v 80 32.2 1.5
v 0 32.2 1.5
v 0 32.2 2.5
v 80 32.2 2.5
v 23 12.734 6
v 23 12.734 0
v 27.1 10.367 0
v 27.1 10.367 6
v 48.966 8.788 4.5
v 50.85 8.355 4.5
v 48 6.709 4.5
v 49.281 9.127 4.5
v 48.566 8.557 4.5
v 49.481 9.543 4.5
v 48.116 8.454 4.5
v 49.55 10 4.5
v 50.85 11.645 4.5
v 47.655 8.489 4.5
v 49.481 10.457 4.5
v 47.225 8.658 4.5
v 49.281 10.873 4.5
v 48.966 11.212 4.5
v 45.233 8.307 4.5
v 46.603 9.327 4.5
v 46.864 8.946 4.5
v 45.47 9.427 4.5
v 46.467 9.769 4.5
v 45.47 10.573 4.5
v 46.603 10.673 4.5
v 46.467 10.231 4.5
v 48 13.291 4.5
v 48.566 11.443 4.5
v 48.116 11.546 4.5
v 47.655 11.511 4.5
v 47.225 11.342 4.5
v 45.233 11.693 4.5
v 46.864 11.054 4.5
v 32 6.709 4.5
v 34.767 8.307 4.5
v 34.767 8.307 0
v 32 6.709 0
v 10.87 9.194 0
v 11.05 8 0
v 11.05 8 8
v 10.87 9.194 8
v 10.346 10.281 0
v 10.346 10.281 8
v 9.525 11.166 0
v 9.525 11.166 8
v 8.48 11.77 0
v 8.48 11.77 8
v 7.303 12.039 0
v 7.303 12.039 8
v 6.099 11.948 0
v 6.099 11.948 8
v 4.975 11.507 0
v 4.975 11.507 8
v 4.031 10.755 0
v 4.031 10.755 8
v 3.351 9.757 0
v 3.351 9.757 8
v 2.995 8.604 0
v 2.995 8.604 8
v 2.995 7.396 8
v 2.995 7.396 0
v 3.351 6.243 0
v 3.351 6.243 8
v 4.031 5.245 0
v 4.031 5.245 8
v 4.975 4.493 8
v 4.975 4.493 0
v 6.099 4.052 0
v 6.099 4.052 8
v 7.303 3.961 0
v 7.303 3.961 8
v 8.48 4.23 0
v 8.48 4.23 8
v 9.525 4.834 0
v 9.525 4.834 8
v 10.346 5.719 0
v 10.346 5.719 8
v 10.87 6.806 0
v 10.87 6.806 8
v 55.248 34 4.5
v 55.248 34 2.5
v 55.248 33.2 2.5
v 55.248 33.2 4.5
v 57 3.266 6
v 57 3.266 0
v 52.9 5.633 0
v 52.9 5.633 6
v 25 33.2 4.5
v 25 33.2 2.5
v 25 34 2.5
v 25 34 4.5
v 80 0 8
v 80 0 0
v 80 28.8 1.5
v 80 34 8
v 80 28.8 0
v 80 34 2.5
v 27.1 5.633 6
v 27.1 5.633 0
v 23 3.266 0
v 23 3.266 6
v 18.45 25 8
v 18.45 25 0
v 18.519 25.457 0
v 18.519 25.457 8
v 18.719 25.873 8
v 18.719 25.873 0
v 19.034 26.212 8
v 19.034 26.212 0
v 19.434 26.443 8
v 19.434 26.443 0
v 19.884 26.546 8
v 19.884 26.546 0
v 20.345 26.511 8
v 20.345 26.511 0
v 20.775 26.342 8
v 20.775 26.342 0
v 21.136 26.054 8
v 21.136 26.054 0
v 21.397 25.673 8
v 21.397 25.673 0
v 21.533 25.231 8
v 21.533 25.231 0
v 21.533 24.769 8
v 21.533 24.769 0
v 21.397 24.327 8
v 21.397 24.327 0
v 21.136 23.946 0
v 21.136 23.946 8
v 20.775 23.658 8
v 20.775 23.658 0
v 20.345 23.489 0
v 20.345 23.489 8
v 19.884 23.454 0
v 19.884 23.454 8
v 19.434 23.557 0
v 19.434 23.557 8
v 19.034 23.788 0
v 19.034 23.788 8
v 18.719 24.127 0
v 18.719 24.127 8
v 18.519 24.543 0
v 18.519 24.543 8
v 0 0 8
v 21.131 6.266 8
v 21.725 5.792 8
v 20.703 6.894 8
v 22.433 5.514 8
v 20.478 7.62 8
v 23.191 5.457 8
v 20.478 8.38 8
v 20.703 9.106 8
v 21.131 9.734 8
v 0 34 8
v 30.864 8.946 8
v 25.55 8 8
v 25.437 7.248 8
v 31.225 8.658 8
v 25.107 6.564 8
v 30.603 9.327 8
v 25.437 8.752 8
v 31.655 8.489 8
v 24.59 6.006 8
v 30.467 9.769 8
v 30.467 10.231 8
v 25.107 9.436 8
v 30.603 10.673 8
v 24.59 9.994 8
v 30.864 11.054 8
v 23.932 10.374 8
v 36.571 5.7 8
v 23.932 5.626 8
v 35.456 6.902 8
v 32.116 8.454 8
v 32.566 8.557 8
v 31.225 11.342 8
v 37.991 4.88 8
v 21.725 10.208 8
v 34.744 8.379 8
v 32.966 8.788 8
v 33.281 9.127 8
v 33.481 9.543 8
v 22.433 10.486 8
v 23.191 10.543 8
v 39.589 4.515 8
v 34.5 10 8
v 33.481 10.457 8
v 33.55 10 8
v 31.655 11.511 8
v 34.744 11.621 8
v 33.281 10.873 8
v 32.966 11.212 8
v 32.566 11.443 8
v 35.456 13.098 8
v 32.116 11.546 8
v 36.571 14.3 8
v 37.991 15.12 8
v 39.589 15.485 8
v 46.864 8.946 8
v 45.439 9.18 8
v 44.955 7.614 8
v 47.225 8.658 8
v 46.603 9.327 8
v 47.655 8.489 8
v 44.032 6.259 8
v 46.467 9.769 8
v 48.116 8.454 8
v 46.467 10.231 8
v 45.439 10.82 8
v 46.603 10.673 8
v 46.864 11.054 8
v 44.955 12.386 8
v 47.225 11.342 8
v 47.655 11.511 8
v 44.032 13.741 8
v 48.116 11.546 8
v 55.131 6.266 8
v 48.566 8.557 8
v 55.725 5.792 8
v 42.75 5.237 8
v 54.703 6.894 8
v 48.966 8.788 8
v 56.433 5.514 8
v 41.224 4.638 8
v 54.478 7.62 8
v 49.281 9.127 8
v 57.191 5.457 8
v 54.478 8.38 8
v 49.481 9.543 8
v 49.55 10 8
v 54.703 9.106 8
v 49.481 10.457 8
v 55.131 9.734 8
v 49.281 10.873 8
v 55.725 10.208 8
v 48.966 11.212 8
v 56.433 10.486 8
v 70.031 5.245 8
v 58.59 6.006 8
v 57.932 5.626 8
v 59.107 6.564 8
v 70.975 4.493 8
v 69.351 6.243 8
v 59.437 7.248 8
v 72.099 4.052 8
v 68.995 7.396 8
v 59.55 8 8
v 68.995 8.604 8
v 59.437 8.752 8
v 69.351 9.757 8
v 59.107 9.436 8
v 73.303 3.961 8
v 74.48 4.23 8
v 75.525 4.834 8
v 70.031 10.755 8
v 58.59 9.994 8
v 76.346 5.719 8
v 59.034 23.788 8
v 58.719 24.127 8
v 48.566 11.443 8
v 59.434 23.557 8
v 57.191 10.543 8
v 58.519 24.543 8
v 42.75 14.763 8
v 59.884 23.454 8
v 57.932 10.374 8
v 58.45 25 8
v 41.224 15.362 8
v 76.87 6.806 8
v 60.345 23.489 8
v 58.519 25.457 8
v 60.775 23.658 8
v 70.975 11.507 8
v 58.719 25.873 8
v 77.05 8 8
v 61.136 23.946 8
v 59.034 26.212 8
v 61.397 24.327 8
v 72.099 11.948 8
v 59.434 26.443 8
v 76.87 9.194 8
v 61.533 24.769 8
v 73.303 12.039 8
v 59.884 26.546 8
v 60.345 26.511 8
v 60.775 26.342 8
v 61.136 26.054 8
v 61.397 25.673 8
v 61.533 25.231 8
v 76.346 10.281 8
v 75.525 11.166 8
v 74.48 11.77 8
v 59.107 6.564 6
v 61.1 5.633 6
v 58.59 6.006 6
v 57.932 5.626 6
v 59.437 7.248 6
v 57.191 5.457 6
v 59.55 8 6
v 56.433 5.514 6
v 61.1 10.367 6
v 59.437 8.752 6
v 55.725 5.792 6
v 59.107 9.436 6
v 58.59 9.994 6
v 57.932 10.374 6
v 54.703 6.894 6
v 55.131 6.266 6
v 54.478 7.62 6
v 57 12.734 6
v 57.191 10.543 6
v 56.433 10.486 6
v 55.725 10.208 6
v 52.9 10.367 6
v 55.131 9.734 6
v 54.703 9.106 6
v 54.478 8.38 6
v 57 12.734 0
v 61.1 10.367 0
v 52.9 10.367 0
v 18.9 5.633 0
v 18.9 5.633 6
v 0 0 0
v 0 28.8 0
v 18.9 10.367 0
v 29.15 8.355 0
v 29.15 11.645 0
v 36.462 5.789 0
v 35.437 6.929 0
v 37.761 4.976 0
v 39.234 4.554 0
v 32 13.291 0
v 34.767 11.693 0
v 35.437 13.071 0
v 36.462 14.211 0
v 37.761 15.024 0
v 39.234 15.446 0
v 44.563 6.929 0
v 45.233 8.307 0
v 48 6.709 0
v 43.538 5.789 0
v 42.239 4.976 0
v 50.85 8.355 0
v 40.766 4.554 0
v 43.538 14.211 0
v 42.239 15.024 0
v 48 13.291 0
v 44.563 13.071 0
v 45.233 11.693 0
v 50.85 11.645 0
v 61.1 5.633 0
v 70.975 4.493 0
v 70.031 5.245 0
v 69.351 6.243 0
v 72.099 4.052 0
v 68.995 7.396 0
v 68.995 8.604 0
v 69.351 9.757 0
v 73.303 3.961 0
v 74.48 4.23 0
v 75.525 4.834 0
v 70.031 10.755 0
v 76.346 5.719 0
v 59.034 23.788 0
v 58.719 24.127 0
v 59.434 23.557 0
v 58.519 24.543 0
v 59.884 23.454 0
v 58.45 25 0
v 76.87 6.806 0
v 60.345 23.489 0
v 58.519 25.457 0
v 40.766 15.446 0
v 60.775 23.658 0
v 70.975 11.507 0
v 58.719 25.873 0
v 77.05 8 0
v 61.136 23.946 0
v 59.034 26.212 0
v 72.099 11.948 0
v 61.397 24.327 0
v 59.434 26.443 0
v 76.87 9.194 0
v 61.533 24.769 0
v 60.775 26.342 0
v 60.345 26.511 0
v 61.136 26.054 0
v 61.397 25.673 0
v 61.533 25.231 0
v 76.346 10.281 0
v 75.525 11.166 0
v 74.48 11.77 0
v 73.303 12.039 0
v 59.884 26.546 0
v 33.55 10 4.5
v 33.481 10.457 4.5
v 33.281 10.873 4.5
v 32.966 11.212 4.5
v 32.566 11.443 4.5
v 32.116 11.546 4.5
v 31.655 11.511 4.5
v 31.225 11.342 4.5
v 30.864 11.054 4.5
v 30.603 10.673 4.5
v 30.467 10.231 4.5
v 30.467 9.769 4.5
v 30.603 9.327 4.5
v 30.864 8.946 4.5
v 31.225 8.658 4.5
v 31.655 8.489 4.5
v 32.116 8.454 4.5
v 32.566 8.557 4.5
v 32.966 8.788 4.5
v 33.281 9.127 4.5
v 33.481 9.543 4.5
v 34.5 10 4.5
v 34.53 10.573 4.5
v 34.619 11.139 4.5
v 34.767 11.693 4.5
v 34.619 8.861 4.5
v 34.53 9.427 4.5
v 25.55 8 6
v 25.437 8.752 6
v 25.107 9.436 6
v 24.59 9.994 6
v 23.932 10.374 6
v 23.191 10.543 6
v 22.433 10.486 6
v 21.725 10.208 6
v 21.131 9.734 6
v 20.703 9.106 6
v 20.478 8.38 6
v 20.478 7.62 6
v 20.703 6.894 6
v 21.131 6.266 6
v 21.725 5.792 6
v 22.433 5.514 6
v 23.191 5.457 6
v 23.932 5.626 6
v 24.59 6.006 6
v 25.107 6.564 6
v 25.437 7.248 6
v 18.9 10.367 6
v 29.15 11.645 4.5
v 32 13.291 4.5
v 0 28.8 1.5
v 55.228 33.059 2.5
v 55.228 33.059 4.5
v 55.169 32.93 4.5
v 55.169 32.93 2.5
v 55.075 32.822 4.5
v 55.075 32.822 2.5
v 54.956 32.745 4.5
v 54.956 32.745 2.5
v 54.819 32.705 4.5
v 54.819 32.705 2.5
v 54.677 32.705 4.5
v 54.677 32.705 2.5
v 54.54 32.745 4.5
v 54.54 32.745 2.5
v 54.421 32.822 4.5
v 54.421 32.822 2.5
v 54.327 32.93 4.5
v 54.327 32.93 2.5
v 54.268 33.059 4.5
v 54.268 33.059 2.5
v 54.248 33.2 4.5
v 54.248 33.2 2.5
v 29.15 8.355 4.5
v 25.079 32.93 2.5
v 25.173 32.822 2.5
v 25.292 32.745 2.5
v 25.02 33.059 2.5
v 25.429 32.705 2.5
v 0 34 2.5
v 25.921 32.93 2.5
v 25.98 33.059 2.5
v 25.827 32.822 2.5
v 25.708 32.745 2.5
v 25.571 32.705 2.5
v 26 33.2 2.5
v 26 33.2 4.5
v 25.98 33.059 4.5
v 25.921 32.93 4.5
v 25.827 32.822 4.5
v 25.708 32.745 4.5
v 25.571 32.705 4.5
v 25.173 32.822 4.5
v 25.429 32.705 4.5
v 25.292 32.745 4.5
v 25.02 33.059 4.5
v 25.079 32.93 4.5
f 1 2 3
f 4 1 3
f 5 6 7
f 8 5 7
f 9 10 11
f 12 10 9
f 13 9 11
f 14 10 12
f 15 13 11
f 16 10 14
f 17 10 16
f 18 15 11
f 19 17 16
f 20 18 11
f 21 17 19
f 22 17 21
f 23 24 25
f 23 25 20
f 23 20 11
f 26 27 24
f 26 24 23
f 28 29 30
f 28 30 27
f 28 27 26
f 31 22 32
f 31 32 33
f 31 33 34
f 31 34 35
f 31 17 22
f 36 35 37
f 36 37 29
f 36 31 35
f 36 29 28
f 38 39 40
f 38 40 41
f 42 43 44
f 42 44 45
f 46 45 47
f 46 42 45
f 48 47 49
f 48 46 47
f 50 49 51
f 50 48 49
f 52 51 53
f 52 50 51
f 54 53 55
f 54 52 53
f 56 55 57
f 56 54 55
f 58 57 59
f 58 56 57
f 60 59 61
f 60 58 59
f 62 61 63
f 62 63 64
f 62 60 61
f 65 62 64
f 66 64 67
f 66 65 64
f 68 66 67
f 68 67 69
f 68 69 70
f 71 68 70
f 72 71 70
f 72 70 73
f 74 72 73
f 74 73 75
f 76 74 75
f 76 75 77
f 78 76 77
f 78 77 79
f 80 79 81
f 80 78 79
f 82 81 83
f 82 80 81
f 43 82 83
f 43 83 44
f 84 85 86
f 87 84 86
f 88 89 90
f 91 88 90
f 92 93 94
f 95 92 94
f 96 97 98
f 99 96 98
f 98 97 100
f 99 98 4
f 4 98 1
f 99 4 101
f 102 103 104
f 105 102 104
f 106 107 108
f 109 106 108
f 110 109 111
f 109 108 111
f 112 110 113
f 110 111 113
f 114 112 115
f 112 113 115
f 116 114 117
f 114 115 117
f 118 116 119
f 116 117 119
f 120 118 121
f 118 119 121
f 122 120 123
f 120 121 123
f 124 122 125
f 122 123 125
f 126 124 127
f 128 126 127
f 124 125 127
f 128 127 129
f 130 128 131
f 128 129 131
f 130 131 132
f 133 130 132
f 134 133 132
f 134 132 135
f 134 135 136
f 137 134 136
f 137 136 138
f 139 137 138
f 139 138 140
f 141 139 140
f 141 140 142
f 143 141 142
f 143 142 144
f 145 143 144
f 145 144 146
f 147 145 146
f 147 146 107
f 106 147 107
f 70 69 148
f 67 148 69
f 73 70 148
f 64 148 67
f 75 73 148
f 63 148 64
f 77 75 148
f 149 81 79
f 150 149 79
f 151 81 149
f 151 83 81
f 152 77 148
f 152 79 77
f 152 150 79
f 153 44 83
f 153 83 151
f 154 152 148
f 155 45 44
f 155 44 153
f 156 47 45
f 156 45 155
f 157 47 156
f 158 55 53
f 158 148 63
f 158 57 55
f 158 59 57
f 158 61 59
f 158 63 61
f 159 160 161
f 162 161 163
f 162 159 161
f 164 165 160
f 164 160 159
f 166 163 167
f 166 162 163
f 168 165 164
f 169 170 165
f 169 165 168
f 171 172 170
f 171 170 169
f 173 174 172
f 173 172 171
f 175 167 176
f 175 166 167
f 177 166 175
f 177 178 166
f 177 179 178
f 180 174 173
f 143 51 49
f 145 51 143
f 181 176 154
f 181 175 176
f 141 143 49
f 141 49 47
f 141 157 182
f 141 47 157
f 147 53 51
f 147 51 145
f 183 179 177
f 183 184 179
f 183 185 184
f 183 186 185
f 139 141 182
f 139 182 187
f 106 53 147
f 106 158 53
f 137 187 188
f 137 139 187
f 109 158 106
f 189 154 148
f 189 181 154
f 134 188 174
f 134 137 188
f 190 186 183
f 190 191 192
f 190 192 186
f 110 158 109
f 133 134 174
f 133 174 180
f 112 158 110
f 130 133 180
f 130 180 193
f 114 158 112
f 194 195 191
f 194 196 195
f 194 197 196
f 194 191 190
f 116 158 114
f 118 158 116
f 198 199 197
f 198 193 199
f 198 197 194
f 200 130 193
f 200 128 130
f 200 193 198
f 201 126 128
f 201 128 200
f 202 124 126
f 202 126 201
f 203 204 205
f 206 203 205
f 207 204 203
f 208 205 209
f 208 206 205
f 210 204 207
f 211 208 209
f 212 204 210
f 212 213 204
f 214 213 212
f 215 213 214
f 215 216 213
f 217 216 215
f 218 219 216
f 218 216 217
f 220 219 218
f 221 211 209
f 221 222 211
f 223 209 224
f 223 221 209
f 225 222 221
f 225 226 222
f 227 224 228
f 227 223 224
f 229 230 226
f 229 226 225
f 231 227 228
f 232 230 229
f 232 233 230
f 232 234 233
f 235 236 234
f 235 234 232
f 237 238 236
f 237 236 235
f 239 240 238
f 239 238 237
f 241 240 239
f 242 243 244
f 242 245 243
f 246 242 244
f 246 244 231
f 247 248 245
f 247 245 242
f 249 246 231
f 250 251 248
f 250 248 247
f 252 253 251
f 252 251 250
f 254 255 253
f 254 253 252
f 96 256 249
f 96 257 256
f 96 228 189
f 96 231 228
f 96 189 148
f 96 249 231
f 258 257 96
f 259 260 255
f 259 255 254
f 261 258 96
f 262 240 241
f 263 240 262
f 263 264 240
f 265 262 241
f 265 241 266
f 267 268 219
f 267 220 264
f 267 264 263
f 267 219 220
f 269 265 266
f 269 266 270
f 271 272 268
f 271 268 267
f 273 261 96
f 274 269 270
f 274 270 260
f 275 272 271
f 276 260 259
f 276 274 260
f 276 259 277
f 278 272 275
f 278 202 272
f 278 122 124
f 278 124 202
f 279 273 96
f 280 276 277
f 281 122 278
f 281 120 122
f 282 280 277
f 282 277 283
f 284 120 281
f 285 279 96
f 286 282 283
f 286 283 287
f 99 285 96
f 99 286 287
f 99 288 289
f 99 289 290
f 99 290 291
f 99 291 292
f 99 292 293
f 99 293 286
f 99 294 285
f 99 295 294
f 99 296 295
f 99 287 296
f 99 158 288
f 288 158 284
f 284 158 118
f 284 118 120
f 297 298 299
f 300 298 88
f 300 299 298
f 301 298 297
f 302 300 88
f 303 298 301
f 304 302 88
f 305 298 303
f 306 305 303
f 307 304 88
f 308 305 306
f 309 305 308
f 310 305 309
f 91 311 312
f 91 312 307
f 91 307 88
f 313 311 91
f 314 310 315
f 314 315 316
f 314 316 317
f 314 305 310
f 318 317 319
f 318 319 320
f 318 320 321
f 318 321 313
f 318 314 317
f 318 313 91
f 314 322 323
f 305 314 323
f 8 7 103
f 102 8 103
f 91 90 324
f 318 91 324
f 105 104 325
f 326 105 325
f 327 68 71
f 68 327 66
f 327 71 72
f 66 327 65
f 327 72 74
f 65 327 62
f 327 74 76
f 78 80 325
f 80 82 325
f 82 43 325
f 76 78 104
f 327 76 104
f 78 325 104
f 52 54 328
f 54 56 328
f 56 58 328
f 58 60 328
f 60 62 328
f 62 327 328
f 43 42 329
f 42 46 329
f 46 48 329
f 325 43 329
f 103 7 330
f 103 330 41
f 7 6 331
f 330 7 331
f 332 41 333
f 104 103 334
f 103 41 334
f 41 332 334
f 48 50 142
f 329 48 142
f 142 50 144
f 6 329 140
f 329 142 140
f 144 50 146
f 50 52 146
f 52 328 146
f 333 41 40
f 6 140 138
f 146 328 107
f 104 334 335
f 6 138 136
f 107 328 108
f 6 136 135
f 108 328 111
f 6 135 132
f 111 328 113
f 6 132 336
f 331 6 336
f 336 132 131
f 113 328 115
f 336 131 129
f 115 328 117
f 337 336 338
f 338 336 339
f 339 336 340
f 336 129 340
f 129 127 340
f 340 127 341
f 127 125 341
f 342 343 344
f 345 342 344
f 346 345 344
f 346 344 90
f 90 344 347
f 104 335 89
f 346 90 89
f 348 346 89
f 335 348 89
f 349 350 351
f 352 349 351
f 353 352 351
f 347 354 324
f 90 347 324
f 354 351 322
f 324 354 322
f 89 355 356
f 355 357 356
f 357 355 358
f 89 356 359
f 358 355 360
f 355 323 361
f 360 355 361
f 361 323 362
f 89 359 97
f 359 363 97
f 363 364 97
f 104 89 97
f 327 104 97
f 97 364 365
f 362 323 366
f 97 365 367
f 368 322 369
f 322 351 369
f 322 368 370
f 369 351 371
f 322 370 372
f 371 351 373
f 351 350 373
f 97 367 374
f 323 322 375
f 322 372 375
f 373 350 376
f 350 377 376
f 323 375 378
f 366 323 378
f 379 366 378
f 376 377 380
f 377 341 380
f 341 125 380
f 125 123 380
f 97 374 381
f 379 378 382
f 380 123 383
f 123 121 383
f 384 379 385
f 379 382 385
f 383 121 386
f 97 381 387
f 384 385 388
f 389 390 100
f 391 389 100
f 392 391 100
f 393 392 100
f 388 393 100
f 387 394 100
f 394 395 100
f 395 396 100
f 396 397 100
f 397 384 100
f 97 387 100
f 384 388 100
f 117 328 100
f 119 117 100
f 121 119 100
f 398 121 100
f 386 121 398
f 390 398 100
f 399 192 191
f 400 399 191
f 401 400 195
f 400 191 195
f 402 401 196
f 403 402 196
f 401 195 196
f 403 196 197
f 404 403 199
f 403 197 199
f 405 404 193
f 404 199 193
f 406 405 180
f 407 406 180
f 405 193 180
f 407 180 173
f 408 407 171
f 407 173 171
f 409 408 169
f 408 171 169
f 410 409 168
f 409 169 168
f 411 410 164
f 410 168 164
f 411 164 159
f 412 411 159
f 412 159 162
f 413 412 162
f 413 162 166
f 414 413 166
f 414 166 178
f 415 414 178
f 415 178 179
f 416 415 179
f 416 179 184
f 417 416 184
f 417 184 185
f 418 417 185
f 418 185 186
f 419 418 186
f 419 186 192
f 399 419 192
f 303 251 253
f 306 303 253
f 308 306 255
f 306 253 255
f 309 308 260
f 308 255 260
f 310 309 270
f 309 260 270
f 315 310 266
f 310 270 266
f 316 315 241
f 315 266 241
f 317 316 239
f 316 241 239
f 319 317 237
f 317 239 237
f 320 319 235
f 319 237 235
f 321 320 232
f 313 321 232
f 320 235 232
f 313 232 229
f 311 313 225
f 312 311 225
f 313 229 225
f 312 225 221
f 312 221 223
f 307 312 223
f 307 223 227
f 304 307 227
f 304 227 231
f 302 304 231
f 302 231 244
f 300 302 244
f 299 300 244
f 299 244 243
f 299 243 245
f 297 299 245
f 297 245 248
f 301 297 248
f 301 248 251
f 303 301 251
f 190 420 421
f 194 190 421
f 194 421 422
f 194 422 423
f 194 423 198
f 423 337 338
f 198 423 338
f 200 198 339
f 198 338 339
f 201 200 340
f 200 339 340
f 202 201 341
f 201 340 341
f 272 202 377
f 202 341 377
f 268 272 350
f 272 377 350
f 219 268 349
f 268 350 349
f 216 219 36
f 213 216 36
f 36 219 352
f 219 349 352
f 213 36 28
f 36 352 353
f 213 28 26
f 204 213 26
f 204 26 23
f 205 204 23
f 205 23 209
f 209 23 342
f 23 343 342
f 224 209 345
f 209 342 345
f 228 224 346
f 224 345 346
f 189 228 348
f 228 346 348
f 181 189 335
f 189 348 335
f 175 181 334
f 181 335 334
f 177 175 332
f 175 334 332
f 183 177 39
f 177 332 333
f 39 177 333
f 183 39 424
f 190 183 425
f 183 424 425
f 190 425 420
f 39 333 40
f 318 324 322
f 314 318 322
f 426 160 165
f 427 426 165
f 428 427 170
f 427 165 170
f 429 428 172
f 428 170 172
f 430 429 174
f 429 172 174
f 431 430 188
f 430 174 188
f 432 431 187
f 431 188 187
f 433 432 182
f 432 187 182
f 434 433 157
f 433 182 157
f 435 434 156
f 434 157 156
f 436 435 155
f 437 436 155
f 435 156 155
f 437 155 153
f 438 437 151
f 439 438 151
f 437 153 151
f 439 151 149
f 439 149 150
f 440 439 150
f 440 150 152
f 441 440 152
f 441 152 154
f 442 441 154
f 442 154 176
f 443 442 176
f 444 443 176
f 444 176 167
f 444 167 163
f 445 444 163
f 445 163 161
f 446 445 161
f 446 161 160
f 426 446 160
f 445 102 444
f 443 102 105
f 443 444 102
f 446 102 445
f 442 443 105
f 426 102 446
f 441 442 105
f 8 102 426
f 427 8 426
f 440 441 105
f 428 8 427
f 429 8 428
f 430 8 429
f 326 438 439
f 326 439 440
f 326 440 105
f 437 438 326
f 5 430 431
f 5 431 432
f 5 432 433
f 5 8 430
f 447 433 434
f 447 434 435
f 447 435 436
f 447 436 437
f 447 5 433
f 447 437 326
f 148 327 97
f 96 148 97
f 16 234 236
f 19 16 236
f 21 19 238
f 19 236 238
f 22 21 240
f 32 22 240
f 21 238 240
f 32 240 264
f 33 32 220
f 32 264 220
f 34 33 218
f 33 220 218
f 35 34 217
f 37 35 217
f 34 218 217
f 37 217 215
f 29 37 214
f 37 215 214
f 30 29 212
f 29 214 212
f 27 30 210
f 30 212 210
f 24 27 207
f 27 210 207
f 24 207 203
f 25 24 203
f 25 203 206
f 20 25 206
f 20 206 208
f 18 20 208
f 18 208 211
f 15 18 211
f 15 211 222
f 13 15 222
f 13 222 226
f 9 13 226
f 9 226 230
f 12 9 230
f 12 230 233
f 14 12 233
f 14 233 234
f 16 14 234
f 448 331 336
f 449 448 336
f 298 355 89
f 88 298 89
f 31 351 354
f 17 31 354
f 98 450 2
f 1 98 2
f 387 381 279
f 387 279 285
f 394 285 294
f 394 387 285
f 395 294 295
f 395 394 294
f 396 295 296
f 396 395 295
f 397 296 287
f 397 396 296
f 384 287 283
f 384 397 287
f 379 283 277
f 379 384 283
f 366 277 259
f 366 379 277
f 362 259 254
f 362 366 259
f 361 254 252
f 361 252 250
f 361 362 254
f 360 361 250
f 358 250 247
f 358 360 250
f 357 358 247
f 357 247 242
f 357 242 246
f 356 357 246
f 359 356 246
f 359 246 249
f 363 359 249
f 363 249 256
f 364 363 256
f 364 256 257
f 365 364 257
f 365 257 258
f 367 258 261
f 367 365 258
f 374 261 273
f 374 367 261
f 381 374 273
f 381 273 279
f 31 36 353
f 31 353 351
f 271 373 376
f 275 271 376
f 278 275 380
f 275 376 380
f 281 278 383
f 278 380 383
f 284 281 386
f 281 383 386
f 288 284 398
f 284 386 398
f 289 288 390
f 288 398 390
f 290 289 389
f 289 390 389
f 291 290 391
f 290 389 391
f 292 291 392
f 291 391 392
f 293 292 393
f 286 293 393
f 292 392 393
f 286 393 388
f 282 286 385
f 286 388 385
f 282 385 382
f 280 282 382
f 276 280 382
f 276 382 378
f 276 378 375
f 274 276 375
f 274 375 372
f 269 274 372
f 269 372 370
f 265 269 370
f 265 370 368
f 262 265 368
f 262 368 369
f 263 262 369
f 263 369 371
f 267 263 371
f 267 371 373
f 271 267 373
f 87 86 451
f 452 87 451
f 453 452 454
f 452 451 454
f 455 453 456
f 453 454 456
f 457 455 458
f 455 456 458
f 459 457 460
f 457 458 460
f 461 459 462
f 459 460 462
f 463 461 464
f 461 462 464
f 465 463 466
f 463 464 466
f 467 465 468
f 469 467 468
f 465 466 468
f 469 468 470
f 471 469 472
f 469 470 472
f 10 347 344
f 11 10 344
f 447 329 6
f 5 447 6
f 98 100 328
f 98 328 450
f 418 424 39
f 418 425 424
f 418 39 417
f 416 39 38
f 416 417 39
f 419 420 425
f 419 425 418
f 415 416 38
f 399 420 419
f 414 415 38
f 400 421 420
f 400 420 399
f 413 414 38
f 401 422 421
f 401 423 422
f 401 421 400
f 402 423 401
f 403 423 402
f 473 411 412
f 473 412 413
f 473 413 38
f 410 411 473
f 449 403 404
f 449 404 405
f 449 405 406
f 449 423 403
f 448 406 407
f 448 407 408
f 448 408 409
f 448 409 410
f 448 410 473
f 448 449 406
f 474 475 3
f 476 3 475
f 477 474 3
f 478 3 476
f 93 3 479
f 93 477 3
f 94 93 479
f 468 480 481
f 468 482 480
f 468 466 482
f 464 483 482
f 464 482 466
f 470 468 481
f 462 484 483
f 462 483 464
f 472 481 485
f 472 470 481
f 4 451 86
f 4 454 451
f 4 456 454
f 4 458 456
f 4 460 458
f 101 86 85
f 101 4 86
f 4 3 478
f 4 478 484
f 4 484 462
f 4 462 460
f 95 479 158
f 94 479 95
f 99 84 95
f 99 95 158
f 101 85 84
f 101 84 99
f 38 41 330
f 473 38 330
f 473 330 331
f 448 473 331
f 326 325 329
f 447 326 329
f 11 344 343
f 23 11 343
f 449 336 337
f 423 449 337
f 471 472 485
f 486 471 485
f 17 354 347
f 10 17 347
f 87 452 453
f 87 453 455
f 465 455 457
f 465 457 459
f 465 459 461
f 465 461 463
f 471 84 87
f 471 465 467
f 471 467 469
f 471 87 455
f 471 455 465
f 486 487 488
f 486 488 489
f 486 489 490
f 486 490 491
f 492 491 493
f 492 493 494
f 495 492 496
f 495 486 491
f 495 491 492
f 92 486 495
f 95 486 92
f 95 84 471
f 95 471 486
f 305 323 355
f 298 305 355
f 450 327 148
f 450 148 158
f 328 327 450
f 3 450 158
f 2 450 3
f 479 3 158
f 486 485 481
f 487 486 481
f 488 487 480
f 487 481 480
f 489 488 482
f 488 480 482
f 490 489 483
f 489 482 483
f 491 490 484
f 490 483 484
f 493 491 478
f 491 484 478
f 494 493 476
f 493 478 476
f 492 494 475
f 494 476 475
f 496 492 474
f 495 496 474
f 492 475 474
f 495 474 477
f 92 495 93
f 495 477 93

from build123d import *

# Parameters (mm, degrees)
SKETCH_2_W           = 80
SKETCH_2_H           = 34
SKETCH_2_R           = 4.05
EXTRUDE_1_DEPTH      = 8
SKETCH_3_R           = 2.55
CUT_EXTRUDE_1_DEPTH  = 88.292611371
CUT_EXTRUDE_2_DEPTH  = 88.292611371
SKETCH_5_R           = 1.55
CUT_EXTRUDE_3_DEPTH  = 88.292611371
CUT_EXTRUDE_5_DEPTH  = 4.5
SKETCH_11_R          = 1.55
CUT_EXTRUDE_7_DEPTH  = 88.292611371
CUT_EXTRUDE_11_DEPTH = 2
CUT_EXTRUDE_13_DEPTH = 6
SKETCH_20_R          = 5.5
CUT_EXTRUDE_14_DEPTH = 88.292611371


with BuildPart() as part:
    # 草图2 → 凸台-拉伸1 (new body)
    with BuildSketch(Plane.XY):
        with Locations((40, 17)):
            Rectangle(SKETCH_2_W, SKETCH_2_H)
        with Locations((7, 8)):
            Circle(SKETCH_2_R, mode=Mode.SUBTRACT)
        with Locations((40, 10)):
            Circle(SKETCH_2_R, mode=Mode.SUBTRACT)
        with Locations((73, 8)):
            Circle(SKETCH_2_R, mode=Mode.SUBTRACT)
    extrude(amount=EXTRUDE_1_DEPTH)

    # 草图3 → 切除-拉伸1 (cut, through all)
    with BuildSketch(Plane.XY.offset(8)):
        with Locations((23, 8)):
            Circle(SKETCH_3_R)
        with Locations((57, 8)):
            Circle(SKETCH_3_R)
    extrude(amount=-CUT_EXTRUDE_1_DEPTH, mode=Mode.SUBTRACT)

    # 草图4 → 切除-拉伸2 (cut, through all)
    with BuildSketch(Plane(origin=(80, 0, 0), x_dir=(0, 0, -1), z_dir=(1, 0, 0))):
        Polygon((-1.5, 32.2), (-2.5, 32.2), (-2.5, 34), (0, 34), (0, 28.8), (-1.5, 28.8), align=None)
    extrude(amount=-CUT_EXTRUDE_2_DEPTH, mode=Mode.SUBTRACT)

    # 草图5 → 切除-拉伸3 (cut, through all)
    with BuildSketch(Plane.XY.offset(8)):
        with Locations((48, 10)):
            Circle(SKETCH_5_R)
        with Locations((32, 10)):
            Circle(SKETCH_5_R)
    extrude(amount=-CUT_EXTRUDE_3_DEPTH, mode=Mode.SUBTRACT)

    # 草图8 → 切除-拉伸5 (cut)
    with BuildSketch(Plane(origin=(0, 0, 0), x_dir=(-1, 0, 0), z_dir=(0, 0, -1))):
        Polygon((-45.15, 8.354551733), (-45.15, 11.645448267), (-48, 13.290896534), (-50.85, 11.645448267), (-50.85, 8.354551733), (-48, 6.709103466), align=None)
        Polygon((-29.15, 8.354551733), (-29.15, 11.645448267), (-32, 13.290896534), (-34.85, 11.645448267), (-34.85, 8.354551733), (-32, 6.709103466), align=None)
    extrude(amount=-CUT_EXTRUDE_5_DEPTH, mode=Mode.SUBTRACT)

    # 草图11 → 切除-拉伸7 (cut, through all)
    with BuildSketch(Plane(origin=(0, 0, 0), x_dir=(-1, 0, 0), z_dir=(0, 0, -1))):
        with Locations((-60, 25)):
            Circle(SKETCH_11_R)
        with Locations((-20, 25)):
            Circle(SKETCH_11_R)
    extrude(amount=-CUT_EXTRUDE_7_DEPTH, mode=Mode.SUBTRACT)

    # 草图19 → 切除-拉伸11 (cut)
    with BuildSketch(Plane(origin=(0, 0, 2.5), x_dir=(-1, 0, 0), z_dir=(0, 0, -1))):
        with BuildLine():
            Line((-25, 34), (-55.247938178, 34))
            Line((-55.247938178, 34), (-55.247938178, 33.2))
            ThreePointArc((-55.247938178, 33.2), (-54.747938178, 32.7), (-54.247938178, 33.2))
            Line((-54.247938178, 33.2), (-26, 33.2))
            ThreePointArc((-26, 33.2), (-25.5, 32.7), (-25, 33.2))
            Line((-25, 33.2), (-25, 34))
        make_face()
    extrude(amount=-CUT_EXTRUDE_11_DEPTH, mode=Mode.SUBTRACT)

    # 草图7 → 切除-拉伸13 (cut)
    with BuildSketch(Plane(origin=(0, 0, 0), x_dir=(-1, 0, 0), z_dir=(0, 0, -1))):
        Polygon((-52.9, 5.632863896), (-52.9, 10.367136104), (-57, 12.734272207), (-61.1, 10.367136104), (-61.1, 5.632863896), (-57, 3.265727793), align=None)
        Polygon((-18.9, 5.632863896), (-18.9, 10.367136104), (-23, 12.734272207), (-27.1, 10.367136104), (-27.1, 5.632863896), (-23, 3.265727793), align=None)
    extrude(amount=-CUT_EXTRUDE_13_DEPTH, mode=Mode.SUBTRACT)

    # 草图20 → 切除-拉伸14 (cut, through all)
    with BuildSketch(Plane(origin=(0, 0, 0), x_dir=(-1, 0, 0), z_dir=(0, 0, -1))):
        with Locations((-40, 10)):
            Circle(SKETCH_20_R)
    extrude(amount=-CUT_EXTRUDE_14_DEPTH, mode=Mode.SUBTRACT)


solid = part.part
